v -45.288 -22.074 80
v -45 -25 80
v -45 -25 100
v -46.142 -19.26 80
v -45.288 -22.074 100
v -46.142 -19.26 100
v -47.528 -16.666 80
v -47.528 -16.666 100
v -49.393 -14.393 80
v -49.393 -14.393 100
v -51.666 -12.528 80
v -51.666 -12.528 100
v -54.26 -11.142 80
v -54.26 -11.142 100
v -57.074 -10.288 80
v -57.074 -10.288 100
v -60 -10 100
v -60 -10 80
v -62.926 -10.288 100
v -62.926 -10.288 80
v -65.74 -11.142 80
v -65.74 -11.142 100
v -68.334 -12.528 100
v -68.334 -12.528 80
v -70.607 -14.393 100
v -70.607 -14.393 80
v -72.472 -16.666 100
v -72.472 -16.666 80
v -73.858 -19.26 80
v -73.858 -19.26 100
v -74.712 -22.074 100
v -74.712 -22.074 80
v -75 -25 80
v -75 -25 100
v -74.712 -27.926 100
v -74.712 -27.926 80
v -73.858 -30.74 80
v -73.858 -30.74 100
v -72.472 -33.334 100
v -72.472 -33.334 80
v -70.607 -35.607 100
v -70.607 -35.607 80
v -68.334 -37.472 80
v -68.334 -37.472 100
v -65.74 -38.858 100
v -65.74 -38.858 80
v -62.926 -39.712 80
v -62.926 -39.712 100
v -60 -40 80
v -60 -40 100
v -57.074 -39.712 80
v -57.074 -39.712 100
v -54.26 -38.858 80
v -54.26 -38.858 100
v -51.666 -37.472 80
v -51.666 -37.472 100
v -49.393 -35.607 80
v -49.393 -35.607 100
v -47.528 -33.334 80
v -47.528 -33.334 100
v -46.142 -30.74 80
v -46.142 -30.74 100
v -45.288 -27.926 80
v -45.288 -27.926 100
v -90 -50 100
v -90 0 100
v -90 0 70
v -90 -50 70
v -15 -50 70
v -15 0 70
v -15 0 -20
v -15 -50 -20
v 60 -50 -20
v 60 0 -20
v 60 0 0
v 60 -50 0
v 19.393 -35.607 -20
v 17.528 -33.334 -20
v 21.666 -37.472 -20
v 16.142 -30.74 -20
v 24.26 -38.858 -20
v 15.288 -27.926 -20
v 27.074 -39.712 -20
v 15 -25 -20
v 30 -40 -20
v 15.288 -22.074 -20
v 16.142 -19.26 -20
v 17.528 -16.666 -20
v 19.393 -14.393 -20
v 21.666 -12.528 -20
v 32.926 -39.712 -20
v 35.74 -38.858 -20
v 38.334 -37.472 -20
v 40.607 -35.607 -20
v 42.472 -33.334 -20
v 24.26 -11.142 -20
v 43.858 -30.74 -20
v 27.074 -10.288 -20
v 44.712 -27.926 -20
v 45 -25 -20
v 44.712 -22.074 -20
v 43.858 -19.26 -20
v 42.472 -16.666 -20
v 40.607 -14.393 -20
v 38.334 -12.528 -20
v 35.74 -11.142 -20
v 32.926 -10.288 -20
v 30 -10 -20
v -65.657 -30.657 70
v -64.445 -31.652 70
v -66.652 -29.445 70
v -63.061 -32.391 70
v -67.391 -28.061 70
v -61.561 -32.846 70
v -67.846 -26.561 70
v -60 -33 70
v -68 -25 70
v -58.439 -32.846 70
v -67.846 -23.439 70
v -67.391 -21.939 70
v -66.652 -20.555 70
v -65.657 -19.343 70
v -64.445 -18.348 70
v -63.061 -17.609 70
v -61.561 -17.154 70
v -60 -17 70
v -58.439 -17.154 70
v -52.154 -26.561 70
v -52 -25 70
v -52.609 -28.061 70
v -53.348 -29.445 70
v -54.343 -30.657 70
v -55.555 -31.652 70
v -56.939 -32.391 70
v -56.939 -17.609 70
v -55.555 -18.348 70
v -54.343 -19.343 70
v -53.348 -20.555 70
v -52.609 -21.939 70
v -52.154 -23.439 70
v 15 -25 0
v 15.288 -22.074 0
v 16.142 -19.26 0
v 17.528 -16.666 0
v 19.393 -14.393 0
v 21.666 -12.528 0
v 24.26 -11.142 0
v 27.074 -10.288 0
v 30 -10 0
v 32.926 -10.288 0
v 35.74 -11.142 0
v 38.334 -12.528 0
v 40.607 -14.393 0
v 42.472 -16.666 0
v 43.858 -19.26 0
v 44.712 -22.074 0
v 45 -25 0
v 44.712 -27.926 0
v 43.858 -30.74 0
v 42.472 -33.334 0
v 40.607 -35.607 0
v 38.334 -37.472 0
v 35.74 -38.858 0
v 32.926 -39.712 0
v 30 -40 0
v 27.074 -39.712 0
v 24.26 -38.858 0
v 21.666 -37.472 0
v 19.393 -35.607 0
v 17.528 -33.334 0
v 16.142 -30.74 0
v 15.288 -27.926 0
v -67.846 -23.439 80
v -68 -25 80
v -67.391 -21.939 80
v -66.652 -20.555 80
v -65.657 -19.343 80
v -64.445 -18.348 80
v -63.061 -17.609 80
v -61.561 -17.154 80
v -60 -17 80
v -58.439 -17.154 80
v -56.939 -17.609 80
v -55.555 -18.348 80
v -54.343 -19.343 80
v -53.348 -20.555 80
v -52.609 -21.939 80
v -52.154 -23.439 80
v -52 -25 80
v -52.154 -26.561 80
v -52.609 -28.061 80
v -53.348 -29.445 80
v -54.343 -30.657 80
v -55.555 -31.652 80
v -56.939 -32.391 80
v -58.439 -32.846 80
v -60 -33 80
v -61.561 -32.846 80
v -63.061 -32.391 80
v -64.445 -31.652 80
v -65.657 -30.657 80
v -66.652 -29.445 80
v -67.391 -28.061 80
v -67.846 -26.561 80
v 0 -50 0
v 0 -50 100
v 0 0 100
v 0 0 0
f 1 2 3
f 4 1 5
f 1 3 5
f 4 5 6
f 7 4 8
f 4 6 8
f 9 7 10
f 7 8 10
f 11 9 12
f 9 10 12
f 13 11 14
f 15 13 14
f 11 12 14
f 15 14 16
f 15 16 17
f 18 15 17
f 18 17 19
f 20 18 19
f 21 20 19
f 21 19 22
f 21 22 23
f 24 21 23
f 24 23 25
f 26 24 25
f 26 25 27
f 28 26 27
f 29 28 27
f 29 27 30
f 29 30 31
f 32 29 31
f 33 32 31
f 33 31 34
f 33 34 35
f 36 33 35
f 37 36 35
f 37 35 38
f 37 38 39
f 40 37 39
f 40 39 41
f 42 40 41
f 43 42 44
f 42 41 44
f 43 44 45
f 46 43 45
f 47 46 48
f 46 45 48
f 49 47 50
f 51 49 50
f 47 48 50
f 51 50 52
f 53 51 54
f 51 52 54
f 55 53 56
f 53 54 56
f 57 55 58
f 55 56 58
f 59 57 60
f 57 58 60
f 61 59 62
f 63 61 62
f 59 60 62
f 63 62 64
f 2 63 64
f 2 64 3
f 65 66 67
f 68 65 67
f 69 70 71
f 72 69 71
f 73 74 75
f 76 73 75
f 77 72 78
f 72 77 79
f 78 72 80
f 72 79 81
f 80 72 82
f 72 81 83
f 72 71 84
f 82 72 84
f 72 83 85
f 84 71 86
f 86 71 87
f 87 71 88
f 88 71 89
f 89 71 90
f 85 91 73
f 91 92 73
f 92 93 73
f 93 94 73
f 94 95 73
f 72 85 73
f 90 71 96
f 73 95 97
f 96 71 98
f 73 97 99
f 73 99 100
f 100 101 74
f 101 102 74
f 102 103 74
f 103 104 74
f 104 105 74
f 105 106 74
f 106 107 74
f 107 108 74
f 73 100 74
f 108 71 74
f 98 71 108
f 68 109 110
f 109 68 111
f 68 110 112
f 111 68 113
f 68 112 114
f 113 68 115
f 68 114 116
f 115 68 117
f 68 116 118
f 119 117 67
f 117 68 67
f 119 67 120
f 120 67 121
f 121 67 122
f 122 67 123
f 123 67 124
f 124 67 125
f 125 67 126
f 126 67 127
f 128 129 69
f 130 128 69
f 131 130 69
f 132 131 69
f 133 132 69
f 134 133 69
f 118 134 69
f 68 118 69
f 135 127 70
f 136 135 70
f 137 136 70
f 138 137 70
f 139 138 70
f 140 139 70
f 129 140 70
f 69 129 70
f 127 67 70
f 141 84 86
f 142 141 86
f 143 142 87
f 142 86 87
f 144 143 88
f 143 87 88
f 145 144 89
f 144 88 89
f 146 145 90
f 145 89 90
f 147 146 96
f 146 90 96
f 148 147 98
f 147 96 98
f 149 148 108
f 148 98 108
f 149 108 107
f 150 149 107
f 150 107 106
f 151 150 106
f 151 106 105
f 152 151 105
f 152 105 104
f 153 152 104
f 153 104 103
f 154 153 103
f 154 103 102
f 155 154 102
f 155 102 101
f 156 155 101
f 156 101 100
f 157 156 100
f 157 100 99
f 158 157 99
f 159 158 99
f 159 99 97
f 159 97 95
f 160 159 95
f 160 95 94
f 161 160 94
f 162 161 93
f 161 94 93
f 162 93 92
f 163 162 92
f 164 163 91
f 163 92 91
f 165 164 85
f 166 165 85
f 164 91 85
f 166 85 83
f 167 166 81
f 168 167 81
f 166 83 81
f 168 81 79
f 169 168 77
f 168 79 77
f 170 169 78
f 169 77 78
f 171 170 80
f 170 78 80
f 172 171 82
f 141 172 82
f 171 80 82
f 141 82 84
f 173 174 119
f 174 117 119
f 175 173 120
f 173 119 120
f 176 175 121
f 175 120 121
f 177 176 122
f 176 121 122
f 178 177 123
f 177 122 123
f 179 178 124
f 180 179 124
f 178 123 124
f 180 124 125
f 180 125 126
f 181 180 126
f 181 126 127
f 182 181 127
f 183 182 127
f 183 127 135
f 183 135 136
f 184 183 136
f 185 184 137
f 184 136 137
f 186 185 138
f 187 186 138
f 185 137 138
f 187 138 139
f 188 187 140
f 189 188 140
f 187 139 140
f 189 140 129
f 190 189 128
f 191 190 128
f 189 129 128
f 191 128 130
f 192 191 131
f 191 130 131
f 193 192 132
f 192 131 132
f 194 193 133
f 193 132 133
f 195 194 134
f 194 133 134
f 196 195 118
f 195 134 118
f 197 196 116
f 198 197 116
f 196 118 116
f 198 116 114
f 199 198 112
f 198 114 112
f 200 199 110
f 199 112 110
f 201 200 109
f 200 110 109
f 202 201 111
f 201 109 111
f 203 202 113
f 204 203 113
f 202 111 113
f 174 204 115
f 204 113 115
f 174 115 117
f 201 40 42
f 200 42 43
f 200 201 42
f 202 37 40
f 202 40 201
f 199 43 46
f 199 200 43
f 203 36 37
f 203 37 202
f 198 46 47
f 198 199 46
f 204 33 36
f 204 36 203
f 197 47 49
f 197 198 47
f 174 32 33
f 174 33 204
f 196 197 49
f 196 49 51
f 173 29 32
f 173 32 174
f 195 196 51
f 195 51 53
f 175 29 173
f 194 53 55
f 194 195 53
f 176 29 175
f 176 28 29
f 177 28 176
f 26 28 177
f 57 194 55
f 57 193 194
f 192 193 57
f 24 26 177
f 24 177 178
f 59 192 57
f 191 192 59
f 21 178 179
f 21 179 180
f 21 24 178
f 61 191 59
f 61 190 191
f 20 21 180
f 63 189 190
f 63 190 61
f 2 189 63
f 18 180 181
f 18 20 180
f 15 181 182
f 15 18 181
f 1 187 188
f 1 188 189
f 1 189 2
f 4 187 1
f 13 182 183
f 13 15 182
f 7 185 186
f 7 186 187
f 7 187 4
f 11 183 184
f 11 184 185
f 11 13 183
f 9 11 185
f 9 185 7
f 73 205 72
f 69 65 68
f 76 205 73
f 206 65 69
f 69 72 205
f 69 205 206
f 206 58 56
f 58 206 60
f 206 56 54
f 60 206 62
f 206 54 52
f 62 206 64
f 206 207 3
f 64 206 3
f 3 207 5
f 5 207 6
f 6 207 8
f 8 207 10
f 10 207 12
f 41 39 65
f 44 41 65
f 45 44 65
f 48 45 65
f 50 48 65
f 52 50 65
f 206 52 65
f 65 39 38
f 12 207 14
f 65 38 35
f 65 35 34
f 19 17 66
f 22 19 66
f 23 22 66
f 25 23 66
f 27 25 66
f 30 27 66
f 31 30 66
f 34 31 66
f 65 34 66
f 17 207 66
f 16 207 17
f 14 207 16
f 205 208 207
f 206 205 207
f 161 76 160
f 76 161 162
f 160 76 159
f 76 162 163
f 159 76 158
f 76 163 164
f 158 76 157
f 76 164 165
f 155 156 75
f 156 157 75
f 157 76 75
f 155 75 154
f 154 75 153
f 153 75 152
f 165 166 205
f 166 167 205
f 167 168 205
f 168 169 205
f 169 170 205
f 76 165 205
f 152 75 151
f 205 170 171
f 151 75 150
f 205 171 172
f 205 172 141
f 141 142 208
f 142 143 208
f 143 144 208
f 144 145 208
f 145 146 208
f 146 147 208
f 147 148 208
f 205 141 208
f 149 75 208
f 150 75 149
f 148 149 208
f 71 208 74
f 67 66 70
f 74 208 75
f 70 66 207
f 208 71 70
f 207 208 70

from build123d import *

# Parameters (mm, degrees)
F1_DEPTH       = 50
F3_D           = 16
F3_CBORE_D     = 30
F3_CBORE_DEPTH = 20
F5_D           = 30
F5_CBORE_D     = 30
F5_CBORE_DEPTH = 20


with BuildPart() as f1:
    # F0 (on Front) → F1 (new body)
    with BuildSketch(Plane.XZ):
        Polygon((0, 100), (-90, 100), (-90, 70), (-15, 70), (-15, -20), (60, -20), (60, 0), (0, 0), align=None)
    extrude(amount=F1_DEPTH)

    # F3 (through all)
    with Locations(Plane.XY.offset(100)):
        with Locations((-60, -25)):
            CounterBoreHole(F3_D / 2, F3_CBORE_D / 2, F3_CBORE_DEPTH)

    # F5 (through all)
    with Locations(Plane.XY):
        with Locations((30, -25)):
            CounterBoreHole(F5_D / 2, F5_CBORE_D / 2, F5_CBORE_DEPTH)


solid = f1.part
